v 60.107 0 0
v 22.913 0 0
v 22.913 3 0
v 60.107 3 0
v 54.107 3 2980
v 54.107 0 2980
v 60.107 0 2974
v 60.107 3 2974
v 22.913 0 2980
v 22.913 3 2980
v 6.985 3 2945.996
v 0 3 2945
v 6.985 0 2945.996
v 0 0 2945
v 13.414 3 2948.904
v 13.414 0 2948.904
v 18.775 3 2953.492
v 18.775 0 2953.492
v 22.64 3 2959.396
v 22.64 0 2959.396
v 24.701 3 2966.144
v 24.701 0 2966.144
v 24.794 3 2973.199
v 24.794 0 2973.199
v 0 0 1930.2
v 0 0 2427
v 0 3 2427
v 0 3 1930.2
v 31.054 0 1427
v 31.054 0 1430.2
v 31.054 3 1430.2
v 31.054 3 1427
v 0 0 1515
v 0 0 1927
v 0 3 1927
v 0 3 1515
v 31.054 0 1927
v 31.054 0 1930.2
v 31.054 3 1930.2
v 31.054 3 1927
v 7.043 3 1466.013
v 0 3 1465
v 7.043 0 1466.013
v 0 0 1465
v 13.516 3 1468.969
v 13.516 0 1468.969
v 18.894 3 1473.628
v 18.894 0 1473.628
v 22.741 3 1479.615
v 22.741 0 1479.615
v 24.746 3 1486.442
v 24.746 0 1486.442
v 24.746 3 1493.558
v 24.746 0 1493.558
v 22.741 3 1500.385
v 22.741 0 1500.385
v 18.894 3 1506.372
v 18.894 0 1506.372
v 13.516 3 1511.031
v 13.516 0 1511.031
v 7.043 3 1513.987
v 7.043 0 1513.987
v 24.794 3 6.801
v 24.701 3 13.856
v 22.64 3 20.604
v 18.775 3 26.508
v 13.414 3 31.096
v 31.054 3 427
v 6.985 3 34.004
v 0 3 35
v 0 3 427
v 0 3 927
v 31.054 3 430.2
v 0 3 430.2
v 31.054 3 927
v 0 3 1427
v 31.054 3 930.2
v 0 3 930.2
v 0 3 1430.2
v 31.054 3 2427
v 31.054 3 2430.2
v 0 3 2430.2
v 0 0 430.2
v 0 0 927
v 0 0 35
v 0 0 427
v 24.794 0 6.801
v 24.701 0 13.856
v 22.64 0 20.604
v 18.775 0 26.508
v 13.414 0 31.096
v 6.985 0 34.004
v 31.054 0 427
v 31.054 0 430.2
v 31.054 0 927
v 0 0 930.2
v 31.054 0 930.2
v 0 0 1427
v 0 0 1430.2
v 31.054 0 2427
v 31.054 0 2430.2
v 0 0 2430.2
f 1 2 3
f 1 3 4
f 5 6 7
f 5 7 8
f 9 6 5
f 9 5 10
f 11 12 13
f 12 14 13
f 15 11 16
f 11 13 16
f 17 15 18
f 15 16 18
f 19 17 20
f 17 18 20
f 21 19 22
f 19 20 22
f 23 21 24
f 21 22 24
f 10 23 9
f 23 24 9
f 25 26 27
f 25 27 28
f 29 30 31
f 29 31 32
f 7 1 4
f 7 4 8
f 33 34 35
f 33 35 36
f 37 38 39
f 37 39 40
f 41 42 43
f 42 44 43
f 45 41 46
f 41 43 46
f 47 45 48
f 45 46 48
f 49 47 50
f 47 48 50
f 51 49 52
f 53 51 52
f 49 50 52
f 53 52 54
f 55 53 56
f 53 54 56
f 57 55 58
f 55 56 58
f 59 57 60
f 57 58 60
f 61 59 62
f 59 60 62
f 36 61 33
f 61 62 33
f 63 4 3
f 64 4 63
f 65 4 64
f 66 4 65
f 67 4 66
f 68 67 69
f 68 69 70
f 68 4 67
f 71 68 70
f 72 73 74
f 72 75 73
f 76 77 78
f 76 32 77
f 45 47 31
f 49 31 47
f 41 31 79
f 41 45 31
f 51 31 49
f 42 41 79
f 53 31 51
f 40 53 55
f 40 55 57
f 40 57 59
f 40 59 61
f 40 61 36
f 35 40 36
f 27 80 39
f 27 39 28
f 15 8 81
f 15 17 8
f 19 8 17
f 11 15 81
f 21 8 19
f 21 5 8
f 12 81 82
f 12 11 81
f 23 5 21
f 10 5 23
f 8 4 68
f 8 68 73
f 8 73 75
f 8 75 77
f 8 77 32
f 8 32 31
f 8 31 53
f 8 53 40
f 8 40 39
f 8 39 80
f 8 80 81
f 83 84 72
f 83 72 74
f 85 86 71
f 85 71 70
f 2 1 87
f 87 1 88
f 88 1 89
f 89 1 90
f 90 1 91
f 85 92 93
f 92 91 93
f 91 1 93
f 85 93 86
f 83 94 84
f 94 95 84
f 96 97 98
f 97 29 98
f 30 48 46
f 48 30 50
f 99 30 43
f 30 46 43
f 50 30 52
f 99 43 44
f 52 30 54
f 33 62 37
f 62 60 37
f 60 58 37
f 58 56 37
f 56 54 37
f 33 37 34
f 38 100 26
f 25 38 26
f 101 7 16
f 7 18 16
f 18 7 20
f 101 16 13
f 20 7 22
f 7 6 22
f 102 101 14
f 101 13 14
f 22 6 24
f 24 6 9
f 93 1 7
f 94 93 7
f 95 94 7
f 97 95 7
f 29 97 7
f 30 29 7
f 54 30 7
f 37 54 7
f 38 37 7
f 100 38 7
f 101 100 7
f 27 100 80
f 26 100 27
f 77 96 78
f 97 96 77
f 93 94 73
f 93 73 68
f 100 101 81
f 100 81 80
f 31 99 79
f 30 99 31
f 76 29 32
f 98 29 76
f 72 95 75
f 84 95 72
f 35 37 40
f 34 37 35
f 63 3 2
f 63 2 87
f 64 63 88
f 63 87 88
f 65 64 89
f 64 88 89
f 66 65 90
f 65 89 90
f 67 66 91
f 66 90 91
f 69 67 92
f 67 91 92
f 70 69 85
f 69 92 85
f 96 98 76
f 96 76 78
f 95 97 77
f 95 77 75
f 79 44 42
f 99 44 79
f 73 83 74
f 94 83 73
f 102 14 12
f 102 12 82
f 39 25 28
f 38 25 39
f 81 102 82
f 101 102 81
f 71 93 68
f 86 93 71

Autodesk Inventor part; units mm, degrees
ref_plane "YZ Plane" through (0, 0, 0) normal (1, 0, 0) x (0, 1, 0)
ref_plane "XZ Plane" through (0, 0, 0) normal (0, 1, 0) x (-1, 0, 0)
ref_plane "XY Plane" through (0, 0, 0) normal (0, 0, 1) x (1, 0, 0)
sketch "Sketch6" plane through (0, 0, 0) normal (0, 1, 0) x (-1, 0, 0)
  line L0 (0, 0) -> (-60.1073, 0)
  line L1 (-60.1073, 0) -> (-60.1073, 2980)
  line L2 (-60.1073, 2980) -> (0, 2980)
  line L3 (0, 2980) -> (0, 0)
  dimension "d26" = 60.1073
  dimension "d27" = 2980
extrude "Plate4" add sketch "Sketch6" along normal blind 3
sketch "Sketch9" plane through (0, 3, 0) normal (0, 1, 0) x (1, 0, 0)
  line L0 (0, -2980) -> (0, 0) projected
  line L1 (60.1073, -2980) -> (0, -2980) projected
  line L2 (60.1073, 0) -> (60.1073, -2980) projected
  line L3 (0, 0) -> (60.1073, 0) projected
  line L4 (25, -210) -> (10, -210) construction
  line L5 (10, -210) -> (10, -10) construction
  line L6 (10, -10) -> (25, -10) construction
  line L7 (25, -10) -> (25, -210) construction
  dimension "d44" = 200
  dimension "d45" = 15
  dimension "d46" = 10
  dimension "d47" = 10
sketch "Sketch7" plane through (0, 0, 0) normal (0, -1, 0) x (1, 0, 0)
  line L0 (0, 2980) -> (60.1073, 2980) projected
  line L1 (0, 0) -> (0, 2980) projected
  line L2 (60.1073, 0) -> (0, 0) projected
  line L3 (60.1073, 2980) -> (60.1073, 0) projected
  line L4 (0, 430.2) -> (31.0536, 430.2)
  line L5 (31.0536, 430.2) -> (31.0536, 427)
  line L6 (31.0536, 427) -> (0, 427)
  line L7 (0, 427) -> (0, 430.2)
  point P0 (0, 427)
  point P1 (0, 200)
  point P2 (46.4173, 200)
  point P3 (0, 427)
  dimension "d29" = 31.0536
  dimension "d30" = 3.2
  dimension "d31" = 427
extrude "Extrusion2" cut sketch "Sketch7" against normal through all contours L4 L5 L6 L1
pattern_linear "Rectangular Pattern1" count 5 spacing 500 along (0, 0, 1) of "Extrusion2"
sketch "Sketch8" plane through (0, 0, 0) normal (0, -1, 0) x (1, 0, 0)
  line L0 (0, 1930.2) -> (0, 2427) projected
  line L1 (0, 430.2) -> (31.0536, 430.2) projected
  line L2 (31.0536, 430.2) -> (31.0536, 427) projected
  line L3 (31.0536, 427) -> (0, 427) projected
  line L4 (0, 0) -> (0, 427) projected
  line L5 (60.1073, 0) -> (0, 0) projected
  line L6 (60.1073, 2980) -> (60.1073, 0) projected
  line L7 (0, 2980) -> (60.1073, 2980) projected
  circle A0 centre (0, 1490) radius 25
  line L8 (0, 1930.2) -> (31.0536, 1930.2) projected
  line L9 (31.0536, 1930.2) -> (31.0536, 1927) projected
  line L10 (31.0536, 1927) -> (0, 1927) projected
  line L11 (0, 1430.2) -> (0, 1927) projected
  line L12 (0, 1430.2) -> (31.0536, 1430.2) projected
  line L13 (31.0536, 1430.2) -> (31.0536, 1427) projected
  line L14 (31.0536, 1427) -> (0, 1427) projected
  line L15 (0, 930.2) -> (0, 1427) projected
  line L16 (0, 930.2) -> (31.0536, 930.2) projected
  line L17 (31.0536, 930.2) -> (31.0536, 927) projected
  line L18 (31.0536, 927) -> (0, 927) projected
  line L19 (0, 430.2) -> (0, 927) projected
  line L20 (0, 2430.2) -> (31.0536, 2430.2) projected
  line L21 (31.0536, 2430.2) -> (31.0536, 2427) projected
  line L22 (31.0536, 2427) -> (0, 2427) projected
  line L23 (0, 2430.2) -> (0, 2980) projected
  dimension "d37" = 50
  dimension "d38" = 1490
extrude "Extrusion3" cut sketch "Sketch8" against normal through all contours L11 A0 | A0 L11
pattern_linear "Rectangular Pattern2" count 3 spacing 1480 along (0, 0, 1) of "Extrusion3" first direction both ways yes
mark "Mark1"
chamfer "Corner Chamfer1" distance 6 angle 45 1 edges at (60.1073, 1.5, 2980)
equation "\"d26\" = Stringer4_deep"
equation "\"d28\" = Thickness"
equation "\"BendReliefWidth\" = Thickness"
equation "\"BendReliefDepth\" = 0.5 * Thickness"
equation "\"CornerReliefSize\" = 4 * Thickness"
equation "\"MinimumRemnant\" = 2 * Thickness"
equation "\"TransitionRadius\" = BendRadius"
equation "\"JacobiRadiusSize\" = BendRadius"
equation "\"GapSize\" = Thickness"
equation "\"Stringer4_deep\" = 60.107271"
equation "\"Thickness\" = 3"
equation "\"BendRadius\" = 5"
properties part number "BSH 0442 stringer 42" material "09g2s"
